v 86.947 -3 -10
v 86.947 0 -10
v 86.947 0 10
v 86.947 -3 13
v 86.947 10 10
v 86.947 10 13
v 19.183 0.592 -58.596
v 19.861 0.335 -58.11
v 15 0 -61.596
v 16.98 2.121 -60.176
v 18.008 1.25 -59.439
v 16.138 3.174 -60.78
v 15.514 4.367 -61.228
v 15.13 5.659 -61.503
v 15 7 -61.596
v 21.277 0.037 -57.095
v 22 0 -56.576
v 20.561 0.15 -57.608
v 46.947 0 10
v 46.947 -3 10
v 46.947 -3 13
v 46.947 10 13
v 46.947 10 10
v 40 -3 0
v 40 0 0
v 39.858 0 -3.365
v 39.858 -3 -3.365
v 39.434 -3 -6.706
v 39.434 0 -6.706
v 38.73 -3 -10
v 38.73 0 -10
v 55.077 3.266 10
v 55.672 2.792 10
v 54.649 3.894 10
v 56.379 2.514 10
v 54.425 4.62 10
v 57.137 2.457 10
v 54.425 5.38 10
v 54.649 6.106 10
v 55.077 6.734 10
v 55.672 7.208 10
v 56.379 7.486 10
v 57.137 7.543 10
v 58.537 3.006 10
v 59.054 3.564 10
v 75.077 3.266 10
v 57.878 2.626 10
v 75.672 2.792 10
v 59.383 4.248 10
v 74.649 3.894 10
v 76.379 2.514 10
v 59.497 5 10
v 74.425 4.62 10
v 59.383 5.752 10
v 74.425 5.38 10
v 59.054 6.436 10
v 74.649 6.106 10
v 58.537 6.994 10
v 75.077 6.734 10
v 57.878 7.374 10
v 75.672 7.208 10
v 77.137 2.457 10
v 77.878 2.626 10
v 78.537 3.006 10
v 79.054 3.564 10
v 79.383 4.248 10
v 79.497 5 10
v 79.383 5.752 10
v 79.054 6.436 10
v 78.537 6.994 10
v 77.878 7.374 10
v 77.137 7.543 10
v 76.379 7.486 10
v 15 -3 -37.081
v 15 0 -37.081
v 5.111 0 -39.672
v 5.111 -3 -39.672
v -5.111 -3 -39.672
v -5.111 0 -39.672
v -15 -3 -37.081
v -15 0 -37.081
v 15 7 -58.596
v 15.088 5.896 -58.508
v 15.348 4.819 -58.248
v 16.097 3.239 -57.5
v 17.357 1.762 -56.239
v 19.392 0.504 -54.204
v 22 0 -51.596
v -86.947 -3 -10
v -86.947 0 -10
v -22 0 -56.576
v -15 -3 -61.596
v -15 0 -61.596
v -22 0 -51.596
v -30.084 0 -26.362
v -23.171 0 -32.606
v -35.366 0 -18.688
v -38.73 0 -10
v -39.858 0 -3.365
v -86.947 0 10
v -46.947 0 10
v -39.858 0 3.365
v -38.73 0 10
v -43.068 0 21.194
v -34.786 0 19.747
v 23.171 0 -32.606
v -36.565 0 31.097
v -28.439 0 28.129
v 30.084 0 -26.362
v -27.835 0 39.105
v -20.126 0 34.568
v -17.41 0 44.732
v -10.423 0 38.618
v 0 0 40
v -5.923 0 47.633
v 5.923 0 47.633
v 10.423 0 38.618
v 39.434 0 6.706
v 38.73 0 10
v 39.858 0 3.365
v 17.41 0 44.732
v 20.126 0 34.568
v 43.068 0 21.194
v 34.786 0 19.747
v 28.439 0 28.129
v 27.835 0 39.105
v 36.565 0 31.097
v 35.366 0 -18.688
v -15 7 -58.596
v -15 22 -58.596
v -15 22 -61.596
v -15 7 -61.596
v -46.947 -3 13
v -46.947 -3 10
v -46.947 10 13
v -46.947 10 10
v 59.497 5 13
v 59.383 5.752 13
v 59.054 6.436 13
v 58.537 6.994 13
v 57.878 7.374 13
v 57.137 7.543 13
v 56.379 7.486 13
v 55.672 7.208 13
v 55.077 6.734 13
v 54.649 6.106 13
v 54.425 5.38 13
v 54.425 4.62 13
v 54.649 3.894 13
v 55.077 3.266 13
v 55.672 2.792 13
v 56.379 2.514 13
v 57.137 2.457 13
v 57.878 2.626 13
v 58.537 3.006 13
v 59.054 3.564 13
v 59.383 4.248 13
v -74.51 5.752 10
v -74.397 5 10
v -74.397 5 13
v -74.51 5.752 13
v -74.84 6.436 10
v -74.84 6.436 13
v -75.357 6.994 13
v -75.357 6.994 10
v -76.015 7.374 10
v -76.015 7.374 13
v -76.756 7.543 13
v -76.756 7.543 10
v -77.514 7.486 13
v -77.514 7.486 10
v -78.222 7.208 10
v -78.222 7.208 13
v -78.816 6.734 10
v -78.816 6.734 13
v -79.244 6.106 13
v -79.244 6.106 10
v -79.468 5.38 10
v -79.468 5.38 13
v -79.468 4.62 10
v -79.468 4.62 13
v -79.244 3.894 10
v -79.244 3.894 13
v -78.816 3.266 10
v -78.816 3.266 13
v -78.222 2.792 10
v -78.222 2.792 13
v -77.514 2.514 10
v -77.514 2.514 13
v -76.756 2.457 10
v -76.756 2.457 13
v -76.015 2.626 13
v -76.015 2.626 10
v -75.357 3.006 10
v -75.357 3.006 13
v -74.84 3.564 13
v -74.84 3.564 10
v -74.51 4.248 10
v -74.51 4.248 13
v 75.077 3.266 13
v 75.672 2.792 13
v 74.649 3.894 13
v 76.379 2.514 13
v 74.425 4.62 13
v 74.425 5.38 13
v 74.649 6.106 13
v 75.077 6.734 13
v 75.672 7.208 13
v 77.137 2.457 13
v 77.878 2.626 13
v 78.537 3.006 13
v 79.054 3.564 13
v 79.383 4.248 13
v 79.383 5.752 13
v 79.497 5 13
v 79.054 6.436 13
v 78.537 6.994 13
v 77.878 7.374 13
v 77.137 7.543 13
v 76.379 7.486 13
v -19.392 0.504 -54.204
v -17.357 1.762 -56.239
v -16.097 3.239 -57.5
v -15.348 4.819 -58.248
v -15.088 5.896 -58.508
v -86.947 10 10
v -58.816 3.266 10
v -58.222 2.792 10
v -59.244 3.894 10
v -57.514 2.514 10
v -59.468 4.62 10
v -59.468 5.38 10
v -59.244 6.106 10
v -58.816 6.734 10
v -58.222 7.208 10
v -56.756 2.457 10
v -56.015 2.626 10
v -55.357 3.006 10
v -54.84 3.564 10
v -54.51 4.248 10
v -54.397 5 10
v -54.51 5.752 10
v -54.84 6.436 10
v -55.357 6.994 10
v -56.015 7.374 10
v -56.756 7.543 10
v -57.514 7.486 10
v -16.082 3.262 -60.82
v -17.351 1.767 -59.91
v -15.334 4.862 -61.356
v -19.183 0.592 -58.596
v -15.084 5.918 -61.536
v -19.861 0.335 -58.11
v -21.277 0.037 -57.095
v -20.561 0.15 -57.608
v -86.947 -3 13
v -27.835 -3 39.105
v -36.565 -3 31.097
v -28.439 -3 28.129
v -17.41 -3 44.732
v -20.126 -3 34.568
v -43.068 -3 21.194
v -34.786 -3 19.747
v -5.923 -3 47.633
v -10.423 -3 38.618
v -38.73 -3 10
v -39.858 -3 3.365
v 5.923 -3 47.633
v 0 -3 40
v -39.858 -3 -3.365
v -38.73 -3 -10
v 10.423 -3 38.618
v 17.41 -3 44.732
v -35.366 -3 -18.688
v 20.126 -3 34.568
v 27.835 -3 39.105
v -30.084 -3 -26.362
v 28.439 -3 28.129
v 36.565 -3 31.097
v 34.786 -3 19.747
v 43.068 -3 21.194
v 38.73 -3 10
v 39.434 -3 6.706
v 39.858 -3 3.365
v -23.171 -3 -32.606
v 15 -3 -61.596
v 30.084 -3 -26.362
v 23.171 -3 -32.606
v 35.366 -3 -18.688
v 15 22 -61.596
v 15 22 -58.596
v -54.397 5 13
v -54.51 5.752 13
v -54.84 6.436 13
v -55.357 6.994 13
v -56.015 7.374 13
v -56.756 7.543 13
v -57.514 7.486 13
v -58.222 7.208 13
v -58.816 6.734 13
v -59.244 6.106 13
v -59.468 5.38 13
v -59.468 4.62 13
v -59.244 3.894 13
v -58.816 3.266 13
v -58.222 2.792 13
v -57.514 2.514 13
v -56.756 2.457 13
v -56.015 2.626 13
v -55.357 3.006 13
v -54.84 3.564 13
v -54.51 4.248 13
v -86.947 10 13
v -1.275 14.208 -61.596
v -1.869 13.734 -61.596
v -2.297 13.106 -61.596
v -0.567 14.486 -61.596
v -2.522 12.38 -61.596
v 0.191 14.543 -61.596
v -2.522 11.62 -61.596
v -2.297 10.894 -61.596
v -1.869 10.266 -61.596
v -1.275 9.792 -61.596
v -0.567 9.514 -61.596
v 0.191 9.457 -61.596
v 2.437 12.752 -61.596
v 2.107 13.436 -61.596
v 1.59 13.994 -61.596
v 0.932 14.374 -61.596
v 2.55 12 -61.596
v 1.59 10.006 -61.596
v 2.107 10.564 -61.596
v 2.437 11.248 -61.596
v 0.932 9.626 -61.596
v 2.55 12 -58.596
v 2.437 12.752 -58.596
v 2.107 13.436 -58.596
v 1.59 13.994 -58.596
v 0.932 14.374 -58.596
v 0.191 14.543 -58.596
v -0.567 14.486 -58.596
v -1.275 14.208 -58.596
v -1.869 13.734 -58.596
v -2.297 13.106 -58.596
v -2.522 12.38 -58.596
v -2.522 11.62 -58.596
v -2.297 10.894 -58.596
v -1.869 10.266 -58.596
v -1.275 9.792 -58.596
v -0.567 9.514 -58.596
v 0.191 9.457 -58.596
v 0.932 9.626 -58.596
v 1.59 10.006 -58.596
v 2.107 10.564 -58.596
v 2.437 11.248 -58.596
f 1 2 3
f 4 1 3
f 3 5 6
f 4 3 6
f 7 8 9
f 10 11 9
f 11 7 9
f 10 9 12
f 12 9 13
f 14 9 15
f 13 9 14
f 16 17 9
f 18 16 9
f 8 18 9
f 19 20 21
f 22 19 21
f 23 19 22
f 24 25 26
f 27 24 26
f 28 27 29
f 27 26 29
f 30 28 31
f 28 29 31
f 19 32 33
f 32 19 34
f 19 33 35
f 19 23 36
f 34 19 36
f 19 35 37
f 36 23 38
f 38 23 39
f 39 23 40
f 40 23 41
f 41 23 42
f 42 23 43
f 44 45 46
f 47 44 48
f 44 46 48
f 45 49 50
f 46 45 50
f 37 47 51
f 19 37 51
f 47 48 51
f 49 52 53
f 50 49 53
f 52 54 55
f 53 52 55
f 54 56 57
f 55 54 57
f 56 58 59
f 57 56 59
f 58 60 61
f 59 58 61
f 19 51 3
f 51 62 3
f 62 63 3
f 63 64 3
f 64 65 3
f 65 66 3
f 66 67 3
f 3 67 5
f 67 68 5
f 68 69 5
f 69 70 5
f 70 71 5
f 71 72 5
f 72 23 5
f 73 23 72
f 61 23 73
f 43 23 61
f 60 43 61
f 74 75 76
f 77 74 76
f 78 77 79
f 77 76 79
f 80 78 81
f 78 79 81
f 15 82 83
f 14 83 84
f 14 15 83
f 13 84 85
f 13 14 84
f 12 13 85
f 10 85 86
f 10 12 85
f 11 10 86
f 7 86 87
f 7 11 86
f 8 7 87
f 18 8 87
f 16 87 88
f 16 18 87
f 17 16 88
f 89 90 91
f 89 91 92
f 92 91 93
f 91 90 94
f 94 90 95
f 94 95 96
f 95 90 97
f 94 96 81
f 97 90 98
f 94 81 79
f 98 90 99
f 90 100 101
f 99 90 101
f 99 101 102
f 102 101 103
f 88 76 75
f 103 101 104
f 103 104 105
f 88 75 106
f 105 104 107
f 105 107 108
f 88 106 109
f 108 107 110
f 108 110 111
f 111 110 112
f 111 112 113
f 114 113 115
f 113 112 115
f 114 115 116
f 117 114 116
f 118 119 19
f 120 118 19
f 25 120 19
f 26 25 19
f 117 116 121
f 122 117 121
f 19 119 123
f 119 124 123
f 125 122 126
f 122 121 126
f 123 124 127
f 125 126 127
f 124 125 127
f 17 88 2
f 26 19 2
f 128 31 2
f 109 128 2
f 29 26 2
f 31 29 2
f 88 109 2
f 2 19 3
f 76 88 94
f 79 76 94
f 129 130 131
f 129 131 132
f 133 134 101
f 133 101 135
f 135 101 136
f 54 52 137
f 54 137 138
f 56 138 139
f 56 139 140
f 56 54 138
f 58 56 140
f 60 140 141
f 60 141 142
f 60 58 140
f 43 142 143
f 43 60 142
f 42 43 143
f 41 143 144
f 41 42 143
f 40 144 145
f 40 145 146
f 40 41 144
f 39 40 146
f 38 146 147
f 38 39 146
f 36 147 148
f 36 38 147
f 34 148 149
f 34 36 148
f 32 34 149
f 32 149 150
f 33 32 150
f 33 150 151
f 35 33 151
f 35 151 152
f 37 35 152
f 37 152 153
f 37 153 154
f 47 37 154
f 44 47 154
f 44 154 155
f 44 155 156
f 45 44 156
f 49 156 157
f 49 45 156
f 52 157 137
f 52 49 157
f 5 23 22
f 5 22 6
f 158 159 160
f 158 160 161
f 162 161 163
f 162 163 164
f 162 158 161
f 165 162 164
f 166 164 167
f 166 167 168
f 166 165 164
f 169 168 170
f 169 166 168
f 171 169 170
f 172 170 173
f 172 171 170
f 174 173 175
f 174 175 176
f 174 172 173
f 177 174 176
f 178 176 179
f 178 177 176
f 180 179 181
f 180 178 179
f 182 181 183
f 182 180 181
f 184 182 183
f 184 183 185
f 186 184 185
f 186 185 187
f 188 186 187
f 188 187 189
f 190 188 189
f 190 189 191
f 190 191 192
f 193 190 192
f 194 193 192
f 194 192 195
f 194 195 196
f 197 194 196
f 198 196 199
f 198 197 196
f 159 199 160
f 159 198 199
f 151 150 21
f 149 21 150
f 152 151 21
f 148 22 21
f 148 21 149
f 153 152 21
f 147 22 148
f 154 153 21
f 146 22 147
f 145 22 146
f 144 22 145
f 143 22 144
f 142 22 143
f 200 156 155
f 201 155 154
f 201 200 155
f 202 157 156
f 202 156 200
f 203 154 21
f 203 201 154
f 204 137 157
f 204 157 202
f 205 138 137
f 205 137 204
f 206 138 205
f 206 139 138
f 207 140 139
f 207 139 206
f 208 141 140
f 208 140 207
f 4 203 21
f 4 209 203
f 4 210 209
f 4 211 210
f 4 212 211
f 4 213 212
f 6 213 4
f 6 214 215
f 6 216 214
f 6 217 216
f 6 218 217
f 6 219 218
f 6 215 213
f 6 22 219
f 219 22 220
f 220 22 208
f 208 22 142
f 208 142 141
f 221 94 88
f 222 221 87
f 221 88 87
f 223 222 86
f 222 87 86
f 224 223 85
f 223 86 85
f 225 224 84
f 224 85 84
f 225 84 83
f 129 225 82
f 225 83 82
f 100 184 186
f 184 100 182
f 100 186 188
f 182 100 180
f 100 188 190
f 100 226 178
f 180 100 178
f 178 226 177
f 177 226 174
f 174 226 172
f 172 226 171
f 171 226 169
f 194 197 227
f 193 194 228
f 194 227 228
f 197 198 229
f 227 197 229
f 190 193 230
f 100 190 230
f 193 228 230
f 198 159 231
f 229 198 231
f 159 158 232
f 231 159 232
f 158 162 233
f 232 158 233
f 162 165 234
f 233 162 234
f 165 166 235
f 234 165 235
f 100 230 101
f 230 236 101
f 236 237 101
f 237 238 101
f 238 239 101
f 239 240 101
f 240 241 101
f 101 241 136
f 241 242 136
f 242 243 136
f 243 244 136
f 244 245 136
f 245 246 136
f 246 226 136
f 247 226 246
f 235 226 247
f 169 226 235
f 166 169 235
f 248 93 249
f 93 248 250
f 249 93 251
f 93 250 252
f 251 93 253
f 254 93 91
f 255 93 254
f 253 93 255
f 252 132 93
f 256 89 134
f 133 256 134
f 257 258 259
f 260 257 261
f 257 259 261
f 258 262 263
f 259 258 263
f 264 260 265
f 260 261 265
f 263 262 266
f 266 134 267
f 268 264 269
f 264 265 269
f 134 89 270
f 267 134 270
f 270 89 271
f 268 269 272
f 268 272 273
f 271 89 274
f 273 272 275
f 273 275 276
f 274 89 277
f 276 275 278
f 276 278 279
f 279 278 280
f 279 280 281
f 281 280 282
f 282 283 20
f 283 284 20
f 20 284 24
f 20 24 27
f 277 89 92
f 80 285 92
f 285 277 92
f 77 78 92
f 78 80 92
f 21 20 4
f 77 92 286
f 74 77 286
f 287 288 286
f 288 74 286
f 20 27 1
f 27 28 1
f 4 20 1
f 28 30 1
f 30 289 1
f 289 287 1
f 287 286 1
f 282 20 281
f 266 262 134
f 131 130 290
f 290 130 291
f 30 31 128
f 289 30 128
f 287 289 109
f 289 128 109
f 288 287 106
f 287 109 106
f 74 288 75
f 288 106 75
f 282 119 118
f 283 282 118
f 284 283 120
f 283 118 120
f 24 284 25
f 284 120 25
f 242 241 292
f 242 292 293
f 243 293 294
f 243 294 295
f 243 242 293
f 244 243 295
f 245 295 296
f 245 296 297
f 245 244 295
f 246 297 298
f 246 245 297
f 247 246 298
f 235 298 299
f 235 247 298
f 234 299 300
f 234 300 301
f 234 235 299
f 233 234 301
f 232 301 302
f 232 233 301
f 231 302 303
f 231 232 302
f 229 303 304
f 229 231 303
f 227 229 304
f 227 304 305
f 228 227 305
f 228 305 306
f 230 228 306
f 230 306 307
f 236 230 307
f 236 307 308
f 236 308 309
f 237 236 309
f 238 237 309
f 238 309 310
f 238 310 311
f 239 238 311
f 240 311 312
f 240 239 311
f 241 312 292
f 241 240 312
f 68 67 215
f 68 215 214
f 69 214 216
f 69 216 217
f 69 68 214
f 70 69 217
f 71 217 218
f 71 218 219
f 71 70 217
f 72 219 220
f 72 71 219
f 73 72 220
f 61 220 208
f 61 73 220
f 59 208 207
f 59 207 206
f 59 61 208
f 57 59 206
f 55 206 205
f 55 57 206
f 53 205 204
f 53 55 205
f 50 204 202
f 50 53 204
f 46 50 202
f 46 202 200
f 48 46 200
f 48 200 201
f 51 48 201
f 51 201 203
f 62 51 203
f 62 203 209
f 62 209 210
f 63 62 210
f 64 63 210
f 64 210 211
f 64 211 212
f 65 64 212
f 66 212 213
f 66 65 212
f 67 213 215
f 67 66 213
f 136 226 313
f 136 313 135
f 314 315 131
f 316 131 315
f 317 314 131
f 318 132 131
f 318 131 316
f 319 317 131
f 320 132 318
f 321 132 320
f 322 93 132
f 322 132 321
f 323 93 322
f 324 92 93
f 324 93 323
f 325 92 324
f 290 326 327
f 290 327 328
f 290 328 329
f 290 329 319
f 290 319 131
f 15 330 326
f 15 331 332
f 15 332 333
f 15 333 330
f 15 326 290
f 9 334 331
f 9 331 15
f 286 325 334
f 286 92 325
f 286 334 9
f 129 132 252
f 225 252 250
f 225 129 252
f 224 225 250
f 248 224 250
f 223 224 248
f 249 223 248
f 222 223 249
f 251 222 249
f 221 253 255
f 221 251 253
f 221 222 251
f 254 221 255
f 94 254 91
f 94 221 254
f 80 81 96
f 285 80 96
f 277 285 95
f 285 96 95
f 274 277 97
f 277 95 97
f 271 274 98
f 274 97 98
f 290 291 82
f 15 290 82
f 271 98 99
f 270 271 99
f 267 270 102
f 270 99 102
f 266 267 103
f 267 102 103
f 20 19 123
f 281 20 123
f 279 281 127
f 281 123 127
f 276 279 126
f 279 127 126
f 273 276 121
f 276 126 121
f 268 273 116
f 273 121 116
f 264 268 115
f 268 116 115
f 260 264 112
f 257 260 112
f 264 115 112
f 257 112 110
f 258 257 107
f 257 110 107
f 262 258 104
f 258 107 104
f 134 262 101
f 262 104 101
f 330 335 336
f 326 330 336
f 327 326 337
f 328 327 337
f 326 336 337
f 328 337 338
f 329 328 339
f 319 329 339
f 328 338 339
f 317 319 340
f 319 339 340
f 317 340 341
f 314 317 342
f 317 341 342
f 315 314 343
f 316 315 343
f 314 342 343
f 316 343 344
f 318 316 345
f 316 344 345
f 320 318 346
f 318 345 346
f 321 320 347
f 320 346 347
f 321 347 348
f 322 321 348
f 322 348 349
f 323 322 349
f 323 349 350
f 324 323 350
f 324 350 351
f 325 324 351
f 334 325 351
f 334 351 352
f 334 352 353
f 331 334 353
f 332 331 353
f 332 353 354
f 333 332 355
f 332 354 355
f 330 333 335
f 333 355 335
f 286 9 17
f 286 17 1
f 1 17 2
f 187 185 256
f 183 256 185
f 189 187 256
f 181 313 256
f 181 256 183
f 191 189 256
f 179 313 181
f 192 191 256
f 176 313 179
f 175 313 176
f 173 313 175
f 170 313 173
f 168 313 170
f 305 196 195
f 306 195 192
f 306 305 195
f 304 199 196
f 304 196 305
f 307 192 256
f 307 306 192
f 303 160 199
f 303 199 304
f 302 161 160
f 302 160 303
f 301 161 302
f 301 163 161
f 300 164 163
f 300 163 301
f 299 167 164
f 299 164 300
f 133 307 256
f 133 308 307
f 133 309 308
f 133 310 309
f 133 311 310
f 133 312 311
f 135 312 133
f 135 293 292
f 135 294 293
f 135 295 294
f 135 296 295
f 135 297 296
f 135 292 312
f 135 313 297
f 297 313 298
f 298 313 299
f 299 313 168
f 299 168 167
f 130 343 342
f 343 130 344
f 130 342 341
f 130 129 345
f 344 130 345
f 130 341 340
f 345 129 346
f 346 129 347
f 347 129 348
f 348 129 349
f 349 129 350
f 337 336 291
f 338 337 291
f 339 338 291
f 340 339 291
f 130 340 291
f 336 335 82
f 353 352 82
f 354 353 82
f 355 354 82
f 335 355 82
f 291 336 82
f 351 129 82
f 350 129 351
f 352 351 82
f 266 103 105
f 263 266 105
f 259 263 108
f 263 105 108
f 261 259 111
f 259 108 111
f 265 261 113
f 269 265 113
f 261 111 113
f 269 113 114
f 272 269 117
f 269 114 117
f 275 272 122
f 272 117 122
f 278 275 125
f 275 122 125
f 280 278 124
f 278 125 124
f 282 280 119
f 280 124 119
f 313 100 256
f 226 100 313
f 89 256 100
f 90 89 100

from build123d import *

# Parameters (mm, degrees)
F0_W         = 30
F0_H         = 3
F1_DEPTH     = 3
F2_W         = 40
F2_H         = 13
F2_R         = 2.55
F3_DEPTH     = 3
F4_W         = 30
F4_H         = 3
F5_DEPTH     = 25
F6_R         = 2.55
F7_DEPTH     = 3
F8_T1_DEPTH  = 30
F8_T6_DEPTH  = 20.5
F8_T11_DEPTH = 20.5
F8_T17_DEPTH = 20.5
F8_T22_DEPTH = 47.5
F8_T30_DEPTH = 20.5
F8_T35_DEPTH = 47.5


# Not quite as in the source:
# - a fillet or chamfer that OpenCascade refuses, or shapes differently, is made with other operations: its cross-section is extruded or revolved along the edge and cut away or added
# - a feature names something its author has since deleted; it is built from what else it names


with BuildPart() as f1:
    # F0 (on Front) → F1 (new body)
    with BuildSketch(Plane.XZ):
        with BuildLine():
            ThreePointArc((-46.9467783772, -10), (-48, 0), (-46.9467783772, 10))
            Line((-46.9467783772, 10), (-86.9467783772, 10))
            Line((-86.9467783772, 10), (-86.9467783772, -10))
            Line((-86.9467783772, -10), (-46.9467783772, -10))
        make_face()
        with BuildLine():
            Line((86.9467783772, 10), (46.9467783772, 10))
            ThreePointArc((46.9467783772, 10), (47.7359684206, 5.0276554125), (48, 0))
            ThreePointArc((48, 0), (47.7359684206, -5.0276554125), (46.9467783772, -10))
            Line((46.9467783772, -10), (86.9467783772, -10))
            Line((86.9467783772, -10), (86.9467783772, 10))
        make_face()
        with BuildLine():
            Line((15, -58.5960524607), (15, -45.5960524607))
            ThreePointArc((15, -45.5960524607), (0, -48), (-15, -45.5960524607))
            Line((-15, -45.5960524607), (-15, -58.5960524607))
            Line((-15, -58.5960524607), (15, -58.5960524607))
        make_face()
        with BuildLine():
            ThreePointArc((-38.7298334621, 10), (0, 40), (38.7298334621, 10))
            Line((38.7298334621, 10), (46.9467783772, 10))
            ThreePointArc((46.9467783772, 10), (0, 48), (-46.9467783772, 10))
            Line((-46.9467783772, 10), (-38.7298334621, 10))
        make_face()
        with BuildLine():
            ThreePointArc((-15, -37.0809924355), (-30.0843611996, -26.3615479669), (-38.7298334621, -10))
            Line((-38.7298334621, -10), (-46.9467783772, -10))
            ThreePointArc((-46.9467783772, -10), (-35.7228298925, -32.060558705), (-15, -45.5960524607))
            Line((-15, -45.5960524607), (-15, -37.0809924355))
        make_face()
        with BuildLine():
            Line((46.9467783772, -10), (38.7298334621, -10))
            ThreePointArc((38.7298334621, -10), (30.0843611996, -26.3615479669), (15, -37.0809924355))
            Line((15, -37.0809924355), (15, -45.5960524607))
            ThreePointArc((15, -45.5960524607), (35.7228298925, -32.060558705), (46.9467783772, -10))
        make_face()
        with BuildLine():
            ThreePointArc((-38.7298334621, -10), (-40, 0), (-38.7298334621, 10))
            Line((-38.7298334621, 10), (-46.9467783772, 10))
            ThreePointArc((-46.9467783772, 10), (-48, 0), (-46.9467783772, -10))
            Line((-46.9467783772, -10), (-38.7298334621, -10))
        make_face()
        with BuildLine():
            Line((15, -45.5960524607), (15, -37.0809924355))
            ThreePointArc((15, -37.0809924355), (0, -40), (-15, -37.0809924355))
            Line((-15, -37.0809924355), (-15, -45.5960524607))
            ThreePointArc((-15, -45.5960524607), (0, -48), (15, -45.5960524607))
        make_face()
        with BuildLine():
            ThreePointArc((38.7298334621, 10), (39.6811878507, 5.0401716993), (40, 0))
            ThreePointArc((40, 0), (39.6811878507, -5.0401716993), (38.7298334621, -10))
            Line((38.7298334621, -10), (46.9467783772, -10))
            ThreePointArc((46.9467783772, -10), (47.7359684206, -5.0276554125), (48, 0))
            ThreePointArc((48, 0), (47.7359684206, 5.0276554125), (46.9467783772, 10))
            Line((46.9467783772, 10), (38.7298334621, 10))
        make_face()
        with Locations((0, -60.0960524607)):
            Rectangle(F0_W, F0_H)
        with BuildLine():
            ThreePointArc((-15, -45.5960524607), (-35.7228298925, -32.060558705), (-46.9467783772, -10))
            Line((-46.9467783772, -10), (-86.9467783772, -10))
            Line((-86.9467783772, -10), (-15, -61.5960524607))
            Line((-15, -61.5960524607), (-15, -58.5960524607))
            Line((-15, -58.5960524607), (-15, -45.5960524607))
        make_face()
        with BuildLine():
            Line((86.9467783772, -10), (46.9467783772, -10))
            ThreePointArc((46.9467783772, -10), (35.7228298925, -32.060558705), (15, -45.5960524607))
            Line((15, -45.5960524607), (15, -58.5960524607))
            Line((15, -58.5960524607), (15, -61.5960524607))
            Line((15, -61.5960524607), (86.9467783772, -10))
        make_face()
    extrude(amount=F1_DEPTH)

    # F2 (on face) → F3 (join)
    with BuildSketch(Plane.XY.offset(10)):
        with Locations((-66.9467783772, 3.5)):
            Rectangle(F2_W, F2_H)
        with Locations((-76.9467783772, 5)):
            Circle(F2_R, mode=Mode.SUBTRACT)
        with Locations((-56.9467783772, 5)):
            Circle(F2_R, mode=Mode.SUBTRACT)
        with Locations((66.9467783772, 3.5)):
            Rectangle(F2_W, F2_H)
        with Locations((56.9467783772, 5)):
            Circle(F2_R, mode=Mode.SUBTRACT)
        with Locations((76.9467783772, 5)):
            Circle(F2_R, mode=Mode.SUBTRACT)
    extrude(amount=F3_DEPTH)

    # F4 (on face) → F5 (join)
    with BuildSketch(Plane.XZ.offset(3)):
        with Locations((0, -60.0960524607)):
            Rectangle(F4_W, F4_H)
    extrude(amount=-F5_DEPTH)

    # F6 (on face) → F7 (cut, through all)
    with BuildSketch(Plane.XY.offset(-58.5960524607)):
        with Locations((0, 12)):
            Circle(F6_R)
    extrude(amount=-F7_DEPTH, mode=Mode.SUBTRACT)

    # F8: fillet of radius 7 on 3 edges, made by hand

    # F8_s2 → F8_t1 (join)
    with BuildSketch(Plane.YZ.offset(-15)):
        with BuildLine():
            ThreePointArc((0, -51.5960524607), (2.0502525317, -56.545799929), (7, -58.5960524607))
            Line((7, -58.5960524607), (0, -58.5960524607))
            Line((0, -58.5960524607), (0, -51.5960524607))
        make_face()
    extrude(amount=F8_T1_DEPTH)


with BuildPart() as f8_tool4:
    # F8_s5 → F8_t6 (new body)
    with BuildSketch(Plane.XY.offset(-58.5960524607)):
        with BuildLine():
            ThreePointArc((-15, 7), (-17.0502525317, 2.0502525317), (-22, 0))
            Line((-22, 0), (-15, 0))
            Line((-15, 0), (-15, 7))
        make_face()
    extrude(amount=-F8_T6_DEPTH)

    split(bisect_by=Plane(origin=(-34.2651759644, 0, -47.7801867313), x_dir=(0, 1, 0), z_dir=(0.5827740813, 0, 0.8126342167)), keep=Keep.TOP)


with BuildPart() as f1_1:
    add(f1.part)

    # F8_t3: union F8_tool4
    add(f8_tool4.part)


with BuildPart() as f8_tool9:
    # F8_s10 → F8_t11 (new body)
    with BuildSketch(Plane.XY.offset(-79.0960524607)):
        with BuildLine():
            ThreePointArc((15, 7), (17.0502525317, 2.0502525317), (22, 0))
            Line((22, 0), (15, 0))
            Line((15, 0), (15, 7))
        make_face()
    extrude(amount=F8_T11_DEPTH)

    split(bisect_by=Plane(origin=(34.2651759644, 0, -47.7801867313), x_dir=(0, 1, 0), z_dir=(-0.5827740813, 0, 0.8126342167)), keep=Keep.TOP)


with BuildPart() as f1_2:
    add(f1_1.part)

    # F8_t8: union F8_tool9
    add(f8_tool9.part)


with BuildPart() as f8_tool15:
    # F8_s16 → F8_t17 (new body)
    with BuildSketch(Plane.XY.offset(-61.5960524607)):
        with BuildLine():
            ThreePointArc((15, 7), (17.0502525317, 2.0502525317), (22, 0))
            Line((22, 0), (15, 0))
            Line((15, 0), (15, 7))
        make_face()
    extrude(amount=F8_T17_DEPTH)

    split(bisect_by=Plane(origin=(34.2651759644, 0, -47.7801867313), x_dir=(0, 1, 0), z_dir=(-0.5827740813, 0, 0.8126342167)), keep=Keep.TOP)

    split(bisect_by=Plane.XY.offset(-58.5960524607), keep=Keep.TOP)


with BuildPart() as f8_tool20:
    # F8_s21 → F8_t22 (new body)
    with BuildSketch(Plane.YZ.offset(32.5)):
        with BuildLine():
            ThreePointArc((0, -51.5960524607), (2.0502525317, -56.545799929), (7, -58.5960524607))
            Line((7, -58.5960524607), (0, -58.5960524607))
            Line((0, -58.5960524607), (0, -51.5960524607))
        make_face()
    extrude(amount=-F8_T22_DEPTH)

    split(bisect_by=Plane(origin=(34.2651759644, 0, -47.7801867313), x_dir=(0, 1, 0), z_dir=(-0.5827740813, 0, 0.8126342167)), keep=Keep.TOP)

    split(bisect_by=Plane.YZ.offset(15), keep=Keep.TOP)


with BuildPart() as f8_tool15_1:
    add(f8_tool15.part)

    # F8_t25: intersect F8_tool20
    add(f8_tool20.part, mode=Mode.INTERSECT)


with BuildPart() as f1_3:
    add(f1_2.part)

    # F8_t13: union F8_tool15
    add(f8_tool15_1.part)


with BuildPart() as f8_tool28:
    # F8_s29 → F8_t30 (new body)
    with BuildSketch(Plane.XY.offset(-41.0960524607)):
        with BuildLine():
            ThreePointArc((-15, 7), (-17.0502525317, 2.0502525317), (-22, 0))
            Line((-22, 0), (-15, 0))
            Line((-15, 0), (-15, 7))
        make_face()
    extrude(amount=-F8_T30_DEPTH)

    split(bisect_by=Plane(origin=(-34.2651759644, 0, -47.7801867313), x_dir=(0, 1, 0), z_dir=(0.5827740813, 0, 0.8126342167)), keep=Keep.TOP)

    split(bisect_by=Plane.XY.offset(-58.5960524607), keep=Keep.TOP)


with BuildPart() as f8_tool33:
    # F8_s34 → F8_t35 (new body)
    with BuildSketch(Plane.YZ.offset(15)):
        with BuildLine():
            ThreePointArc((0, -51.5960524607), (2.0502525317, -56.545799929), (7, -58.5960524607))
            Line((7, -58.5960524607), (0, -58.5960524607))
            Line((0, -58.5960524607), (0, -51.5960524607))
        make_face()
    extrude(amount=-F8_T35_DEPTH)

    split(bisect_by=Plane(origin=(-34.2651759644, 0, -47.7801867313), x_dir=(0, 1, 0), z_dir=(0.5827740813, 0, 0.8126342167)), keep=Keep.TOP)

    split(bisect_by=Plane.YZ.offset(-15), keep=Keep.BOTTOM)


with BuildPart() as f8_tool28_1:
    add(f8_tool28.part)

    # F8_t38: intersect F8_tool33
    add(f8_tool33.part, mode=Mode.INTERSECT)


with BuildPart() as f1_4:
    add(f1_3.part)

    # F8_t26: union F8_tool28
    add(f8_tool28_1.part)


solid = f1_4.part
